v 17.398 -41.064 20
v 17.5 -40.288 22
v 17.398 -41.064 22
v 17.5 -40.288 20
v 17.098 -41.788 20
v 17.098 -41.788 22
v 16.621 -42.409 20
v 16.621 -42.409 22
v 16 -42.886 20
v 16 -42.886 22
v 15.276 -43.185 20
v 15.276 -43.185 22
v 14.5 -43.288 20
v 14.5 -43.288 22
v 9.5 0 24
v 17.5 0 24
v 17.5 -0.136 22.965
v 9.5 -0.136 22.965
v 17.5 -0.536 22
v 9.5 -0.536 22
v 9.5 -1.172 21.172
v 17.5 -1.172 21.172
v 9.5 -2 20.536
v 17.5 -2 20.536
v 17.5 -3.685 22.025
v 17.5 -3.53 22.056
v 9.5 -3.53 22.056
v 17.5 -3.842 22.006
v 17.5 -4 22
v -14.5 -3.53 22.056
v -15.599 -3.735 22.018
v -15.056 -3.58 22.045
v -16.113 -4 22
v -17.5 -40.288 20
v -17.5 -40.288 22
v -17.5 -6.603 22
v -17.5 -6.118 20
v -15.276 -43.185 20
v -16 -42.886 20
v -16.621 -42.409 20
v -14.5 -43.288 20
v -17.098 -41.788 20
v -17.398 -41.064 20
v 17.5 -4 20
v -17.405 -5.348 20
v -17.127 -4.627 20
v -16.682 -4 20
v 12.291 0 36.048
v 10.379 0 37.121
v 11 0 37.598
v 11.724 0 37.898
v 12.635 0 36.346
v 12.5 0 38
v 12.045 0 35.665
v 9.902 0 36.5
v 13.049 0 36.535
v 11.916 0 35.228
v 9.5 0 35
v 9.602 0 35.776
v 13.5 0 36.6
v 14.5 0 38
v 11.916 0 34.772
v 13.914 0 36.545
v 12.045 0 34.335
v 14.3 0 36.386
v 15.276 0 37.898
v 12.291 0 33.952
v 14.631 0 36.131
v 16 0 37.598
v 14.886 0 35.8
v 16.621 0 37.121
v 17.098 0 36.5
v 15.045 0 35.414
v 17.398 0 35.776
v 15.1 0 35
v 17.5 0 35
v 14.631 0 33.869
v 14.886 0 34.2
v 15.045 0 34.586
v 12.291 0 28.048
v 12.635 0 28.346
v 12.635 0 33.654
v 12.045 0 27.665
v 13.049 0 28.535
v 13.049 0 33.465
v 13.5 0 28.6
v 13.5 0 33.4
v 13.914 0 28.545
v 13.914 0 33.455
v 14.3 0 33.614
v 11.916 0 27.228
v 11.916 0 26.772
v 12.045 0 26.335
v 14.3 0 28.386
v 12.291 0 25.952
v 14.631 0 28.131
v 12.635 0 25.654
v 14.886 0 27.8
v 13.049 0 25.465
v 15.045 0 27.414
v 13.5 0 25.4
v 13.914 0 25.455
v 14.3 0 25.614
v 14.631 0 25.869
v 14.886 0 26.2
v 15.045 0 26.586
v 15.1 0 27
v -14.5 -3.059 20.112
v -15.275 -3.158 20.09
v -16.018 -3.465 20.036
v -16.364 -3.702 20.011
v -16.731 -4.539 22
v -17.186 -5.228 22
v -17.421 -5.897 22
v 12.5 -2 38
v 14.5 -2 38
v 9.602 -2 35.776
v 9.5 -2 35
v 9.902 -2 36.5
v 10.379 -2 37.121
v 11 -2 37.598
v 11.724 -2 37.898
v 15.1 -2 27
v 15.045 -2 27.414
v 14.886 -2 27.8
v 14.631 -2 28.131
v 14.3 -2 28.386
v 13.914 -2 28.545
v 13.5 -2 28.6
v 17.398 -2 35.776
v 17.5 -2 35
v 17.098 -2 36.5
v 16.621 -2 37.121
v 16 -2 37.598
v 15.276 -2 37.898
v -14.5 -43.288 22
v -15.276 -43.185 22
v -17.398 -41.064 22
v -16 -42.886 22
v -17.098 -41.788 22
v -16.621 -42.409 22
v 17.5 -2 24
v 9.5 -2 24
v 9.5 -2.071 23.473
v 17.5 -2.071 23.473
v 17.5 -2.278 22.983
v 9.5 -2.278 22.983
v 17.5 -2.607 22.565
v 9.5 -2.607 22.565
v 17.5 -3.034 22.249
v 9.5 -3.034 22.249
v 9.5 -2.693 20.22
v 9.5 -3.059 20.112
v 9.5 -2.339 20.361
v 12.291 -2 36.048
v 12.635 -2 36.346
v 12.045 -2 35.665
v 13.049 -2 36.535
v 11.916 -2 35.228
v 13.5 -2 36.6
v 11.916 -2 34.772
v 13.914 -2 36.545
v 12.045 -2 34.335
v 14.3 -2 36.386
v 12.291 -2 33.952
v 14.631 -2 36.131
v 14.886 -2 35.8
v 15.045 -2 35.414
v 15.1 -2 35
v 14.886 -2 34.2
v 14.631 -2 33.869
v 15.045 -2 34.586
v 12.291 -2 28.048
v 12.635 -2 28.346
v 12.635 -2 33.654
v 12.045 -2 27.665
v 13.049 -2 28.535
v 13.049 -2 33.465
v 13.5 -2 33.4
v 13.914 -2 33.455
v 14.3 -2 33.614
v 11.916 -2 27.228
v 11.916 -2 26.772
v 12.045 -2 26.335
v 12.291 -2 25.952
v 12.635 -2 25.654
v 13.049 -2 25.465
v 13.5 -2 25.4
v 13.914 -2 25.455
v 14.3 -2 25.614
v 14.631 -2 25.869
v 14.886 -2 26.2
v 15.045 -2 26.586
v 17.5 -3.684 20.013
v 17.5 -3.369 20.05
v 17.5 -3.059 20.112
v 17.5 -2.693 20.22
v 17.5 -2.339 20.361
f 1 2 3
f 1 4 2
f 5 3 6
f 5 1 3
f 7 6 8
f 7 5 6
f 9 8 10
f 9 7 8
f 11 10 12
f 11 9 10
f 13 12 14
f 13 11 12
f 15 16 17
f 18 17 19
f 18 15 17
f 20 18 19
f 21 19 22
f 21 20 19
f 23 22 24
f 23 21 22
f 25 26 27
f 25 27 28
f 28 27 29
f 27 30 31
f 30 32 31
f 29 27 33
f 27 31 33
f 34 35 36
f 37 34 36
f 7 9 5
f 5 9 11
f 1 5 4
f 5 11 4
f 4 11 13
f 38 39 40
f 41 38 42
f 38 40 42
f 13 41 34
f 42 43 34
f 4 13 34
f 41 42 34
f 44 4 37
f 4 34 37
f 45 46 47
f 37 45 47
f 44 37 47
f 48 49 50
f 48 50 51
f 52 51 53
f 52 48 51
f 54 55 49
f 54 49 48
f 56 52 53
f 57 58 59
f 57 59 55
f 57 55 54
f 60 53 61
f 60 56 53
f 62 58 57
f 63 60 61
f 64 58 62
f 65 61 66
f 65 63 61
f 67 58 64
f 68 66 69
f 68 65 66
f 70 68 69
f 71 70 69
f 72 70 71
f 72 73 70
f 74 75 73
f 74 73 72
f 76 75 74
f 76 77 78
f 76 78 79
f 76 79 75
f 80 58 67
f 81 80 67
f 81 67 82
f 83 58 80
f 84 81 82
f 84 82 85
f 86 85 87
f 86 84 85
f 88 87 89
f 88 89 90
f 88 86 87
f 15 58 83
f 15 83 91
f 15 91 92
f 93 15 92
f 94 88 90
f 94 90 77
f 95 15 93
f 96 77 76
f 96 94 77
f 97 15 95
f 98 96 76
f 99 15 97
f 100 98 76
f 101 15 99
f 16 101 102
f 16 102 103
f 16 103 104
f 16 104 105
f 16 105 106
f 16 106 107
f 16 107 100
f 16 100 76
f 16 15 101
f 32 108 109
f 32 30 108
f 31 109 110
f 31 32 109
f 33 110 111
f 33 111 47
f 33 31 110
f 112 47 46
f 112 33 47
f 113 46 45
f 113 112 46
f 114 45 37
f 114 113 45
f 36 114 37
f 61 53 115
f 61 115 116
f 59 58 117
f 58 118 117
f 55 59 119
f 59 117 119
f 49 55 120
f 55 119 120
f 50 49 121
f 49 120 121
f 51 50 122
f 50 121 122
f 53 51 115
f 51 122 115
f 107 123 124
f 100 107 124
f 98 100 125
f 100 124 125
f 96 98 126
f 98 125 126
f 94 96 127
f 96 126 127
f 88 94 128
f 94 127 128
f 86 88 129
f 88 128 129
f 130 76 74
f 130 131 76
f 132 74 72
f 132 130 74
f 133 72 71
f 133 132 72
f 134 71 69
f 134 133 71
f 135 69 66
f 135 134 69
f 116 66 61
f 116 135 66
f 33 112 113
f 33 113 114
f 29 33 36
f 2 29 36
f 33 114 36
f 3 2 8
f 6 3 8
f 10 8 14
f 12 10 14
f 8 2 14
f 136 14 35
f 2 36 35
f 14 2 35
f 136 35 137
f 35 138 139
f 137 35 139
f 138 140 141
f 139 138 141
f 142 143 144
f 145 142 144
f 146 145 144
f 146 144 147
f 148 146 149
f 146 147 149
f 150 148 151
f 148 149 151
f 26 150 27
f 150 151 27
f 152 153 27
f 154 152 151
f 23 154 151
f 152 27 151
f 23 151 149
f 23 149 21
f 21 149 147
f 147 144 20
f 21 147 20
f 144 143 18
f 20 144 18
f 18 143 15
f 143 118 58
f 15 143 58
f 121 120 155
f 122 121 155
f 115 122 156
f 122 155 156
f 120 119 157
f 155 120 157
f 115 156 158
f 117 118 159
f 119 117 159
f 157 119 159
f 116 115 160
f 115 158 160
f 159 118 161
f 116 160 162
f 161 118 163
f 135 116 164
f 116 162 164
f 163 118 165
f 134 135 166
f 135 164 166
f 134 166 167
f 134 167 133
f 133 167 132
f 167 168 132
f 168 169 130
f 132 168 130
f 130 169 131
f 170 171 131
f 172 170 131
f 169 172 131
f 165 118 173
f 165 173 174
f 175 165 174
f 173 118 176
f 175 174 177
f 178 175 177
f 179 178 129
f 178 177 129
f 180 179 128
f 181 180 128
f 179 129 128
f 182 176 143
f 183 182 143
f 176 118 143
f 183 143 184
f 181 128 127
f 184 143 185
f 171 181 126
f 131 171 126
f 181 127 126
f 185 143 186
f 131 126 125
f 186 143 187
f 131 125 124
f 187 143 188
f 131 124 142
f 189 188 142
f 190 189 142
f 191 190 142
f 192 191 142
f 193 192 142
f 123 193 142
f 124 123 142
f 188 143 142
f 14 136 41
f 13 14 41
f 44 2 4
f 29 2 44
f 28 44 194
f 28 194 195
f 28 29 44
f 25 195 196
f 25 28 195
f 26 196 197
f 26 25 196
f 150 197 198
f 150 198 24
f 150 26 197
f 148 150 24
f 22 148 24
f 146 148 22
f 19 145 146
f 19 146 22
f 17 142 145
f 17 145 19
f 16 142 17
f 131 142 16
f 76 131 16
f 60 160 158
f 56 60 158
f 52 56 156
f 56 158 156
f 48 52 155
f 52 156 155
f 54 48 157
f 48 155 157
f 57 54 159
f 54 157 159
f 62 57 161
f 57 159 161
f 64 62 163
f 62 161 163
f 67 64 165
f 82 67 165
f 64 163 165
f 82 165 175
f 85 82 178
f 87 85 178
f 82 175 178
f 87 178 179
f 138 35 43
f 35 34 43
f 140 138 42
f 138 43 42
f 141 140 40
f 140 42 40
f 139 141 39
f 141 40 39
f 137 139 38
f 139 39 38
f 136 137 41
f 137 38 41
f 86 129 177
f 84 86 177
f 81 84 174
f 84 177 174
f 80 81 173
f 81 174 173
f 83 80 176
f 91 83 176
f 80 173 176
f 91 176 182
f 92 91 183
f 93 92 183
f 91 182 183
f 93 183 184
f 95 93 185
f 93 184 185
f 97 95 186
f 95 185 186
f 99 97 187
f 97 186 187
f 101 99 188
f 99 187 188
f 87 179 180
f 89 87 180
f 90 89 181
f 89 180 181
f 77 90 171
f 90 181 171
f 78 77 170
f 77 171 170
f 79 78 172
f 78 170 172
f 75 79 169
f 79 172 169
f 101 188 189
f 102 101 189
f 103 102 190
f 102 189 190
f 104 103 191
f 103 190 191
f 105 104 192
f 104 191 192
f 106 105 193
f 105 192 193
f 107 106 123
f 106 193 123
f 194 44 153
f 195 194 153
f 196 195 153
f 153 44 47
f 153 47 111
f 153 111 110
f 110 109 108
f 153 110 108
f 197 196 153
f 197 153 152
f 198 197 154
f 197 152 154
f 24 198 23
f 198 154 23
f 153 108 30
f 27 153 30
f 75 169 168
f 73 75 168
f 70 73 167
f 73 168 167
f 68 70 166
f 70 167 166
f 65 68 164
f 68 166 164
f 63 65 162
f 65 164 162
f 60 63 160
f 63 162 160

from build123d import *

# Parameters (mm, degrees)
SM_BASE_FLANGE_1_DEPTH = 2
OTHER_START            = -17.5
OTHER_1_DEPTH          = 35
OTHER_1_2_DEPTH        = 35
OTHER_START_2          = 9.5
OTHER_1_3_DEPTH        = 8
CUT_EXTRUDE_1_DEPTH    = 10
FILLET_1_R             = 3


# Read off the part's stored shape, not the designer's step: 绘制的折弯1
# Sheet-metal steps are written as plain solids
with BuildPart() as part:
    # Sketch 1 → 基体-法兰1 (new body)
    with BuildSketch(Plane(origin=(0, 0, 0), x_dir=(1, 0, 0), z_dir=(0, 1, 0))):
        Polygon((-17.5, -20), (9.5, -20), (9.5, -38), (17.5, -38), (17.5, -20), (17.5, 20), (-17.5, 20), align=None)
    extrude(amount=-SM_BASE_FLANGE_1_DEPTH)

    # Other 1 outline → Other 1 (cut)
    with BuildSketch(Plane.YZ.offset(OTHER_START)):
        with BuildLine():
            ThreePointArc((0, 24), (-0.535898385, 22), (-2, 20.535898384))
            Line((-2, 20.535898384), (-2, -20))
            Line((-2, -20), (0, -20))
            Line((0, -20), (0, 24))
        make_face()
    extrude(amount=OTHER_1_DEPTH, mode=Mode.SUBTRACT)



with BuildPart() as body_2:
    # Other 1 2 outline → Other 1 2 (new body)
    with BuildSketch(Plane.YZ.offset(OTHER_START)):
        with BuildLine():
            ThreePointArc((-3.529524853, 22.056124198), (-3.763094539, 22.014080615), (-4, 22))
            Line((-4, 22), (-43.28761102, 22))
            Line((-43.28761102, 22), (-43.28761102, 20))
            Line((-43.28761102, 20), (-4, 20))
            ThreePointArc((-4, 20), (-3.526189079, 20.02816123), (-3.059049707, 20.112248394))
            Line((-3.059049707, 20.112248394), (-3.529524853, 22.056124198))
        make_face()
    extrude(amount=OTHER_1_2_DEPTH)


with BuildPart() as part_1:
    add(part.part)

    add(body_2.part)  # Other 1 3 merges body 2
    # Other 1 3 outline → Other 1 3 (add)
    with BuildSketch(Plane.YZ.offset(OTHER_START_2)):
        with BuildLine():
            ThreePointArc((-2, 24), (-2.428225479, 22.763260394), (-3.529524853, 22.056124198))
            Line((-3.529524853, 22.056124198), (-3.059049707, 20.112248394))
            ThreePointArc((-3.059049707, 20.112248394), (-2.514346277, 20.286129645), (-2, 20.535898384))
            Line((-2, 20.535898384), (-2, 24))
        make_face()
    extrude(amount=OTHER_1_3_DEPTH)

    # 草图7 → 切除-拉伸1 (cut)
    with BuildSketch(Plane.XZ.offset(2)):
        with BuildLine():
            ThreePointArc((15.1, 35), (14.63137085, 36.13137085), (13.5, 36.6))
            Line((13.5, 36.6), (13.5, 35))
            Line((13.5, 35), (13.5, 33.4))
            ThreePointArc((13.5, 33.4), (14.63137085, 33.86862915), (15.1, 35))
        make_face()
        with BuildLine():
            Line((13.5, 35), (13.5, 36.6))
            ThreePointArc((13.5, 36.6), (11.9, 35), (13.5, 33.4))
            Line((13.5, 33.4), (13.5, 35))
        make_face()
        with BuildLine():
            ThreePointArc((15.1, 27), (14.63137085, 28.13137085), (13.5, 28.6))
            Line((13.5, 28.6), (13.5, 27))
            Line((13.5, 27), (13.5, 25.4))
            ThreePointArc((13.5, 25.4), (14.63137085, 25.86862915), (15.1, 27))
        make_face()
        with BuildLine():
            Line((13.5, 27), (13.5, 28.6))
            ThreePointArc((13.5, 28.6), (11.9, 27), (13.5, 25.4))
            Line((13.5, 25.4), (13.5, 27))
        make_face()
    extrude(amount=-CUT_EXTRUDE_1_DEPTH, mode=Mode.SUBTRACT)

    # 圆角1
    fillet_1_edges = [part_1.edges().sort_by_distance(p)[0] for p in [
        (-17.5, -43.28761102, 21),
        (17.5, -43.28761102, 21),
        (17.5, -1, 38),
        (9.5, -1, 38),
        (-17.5, -3.29428728, 21.084186296),
    ]]
    fillet(fillet_1_edges, radius=FILLET_1_R)


solid = part_1.part
